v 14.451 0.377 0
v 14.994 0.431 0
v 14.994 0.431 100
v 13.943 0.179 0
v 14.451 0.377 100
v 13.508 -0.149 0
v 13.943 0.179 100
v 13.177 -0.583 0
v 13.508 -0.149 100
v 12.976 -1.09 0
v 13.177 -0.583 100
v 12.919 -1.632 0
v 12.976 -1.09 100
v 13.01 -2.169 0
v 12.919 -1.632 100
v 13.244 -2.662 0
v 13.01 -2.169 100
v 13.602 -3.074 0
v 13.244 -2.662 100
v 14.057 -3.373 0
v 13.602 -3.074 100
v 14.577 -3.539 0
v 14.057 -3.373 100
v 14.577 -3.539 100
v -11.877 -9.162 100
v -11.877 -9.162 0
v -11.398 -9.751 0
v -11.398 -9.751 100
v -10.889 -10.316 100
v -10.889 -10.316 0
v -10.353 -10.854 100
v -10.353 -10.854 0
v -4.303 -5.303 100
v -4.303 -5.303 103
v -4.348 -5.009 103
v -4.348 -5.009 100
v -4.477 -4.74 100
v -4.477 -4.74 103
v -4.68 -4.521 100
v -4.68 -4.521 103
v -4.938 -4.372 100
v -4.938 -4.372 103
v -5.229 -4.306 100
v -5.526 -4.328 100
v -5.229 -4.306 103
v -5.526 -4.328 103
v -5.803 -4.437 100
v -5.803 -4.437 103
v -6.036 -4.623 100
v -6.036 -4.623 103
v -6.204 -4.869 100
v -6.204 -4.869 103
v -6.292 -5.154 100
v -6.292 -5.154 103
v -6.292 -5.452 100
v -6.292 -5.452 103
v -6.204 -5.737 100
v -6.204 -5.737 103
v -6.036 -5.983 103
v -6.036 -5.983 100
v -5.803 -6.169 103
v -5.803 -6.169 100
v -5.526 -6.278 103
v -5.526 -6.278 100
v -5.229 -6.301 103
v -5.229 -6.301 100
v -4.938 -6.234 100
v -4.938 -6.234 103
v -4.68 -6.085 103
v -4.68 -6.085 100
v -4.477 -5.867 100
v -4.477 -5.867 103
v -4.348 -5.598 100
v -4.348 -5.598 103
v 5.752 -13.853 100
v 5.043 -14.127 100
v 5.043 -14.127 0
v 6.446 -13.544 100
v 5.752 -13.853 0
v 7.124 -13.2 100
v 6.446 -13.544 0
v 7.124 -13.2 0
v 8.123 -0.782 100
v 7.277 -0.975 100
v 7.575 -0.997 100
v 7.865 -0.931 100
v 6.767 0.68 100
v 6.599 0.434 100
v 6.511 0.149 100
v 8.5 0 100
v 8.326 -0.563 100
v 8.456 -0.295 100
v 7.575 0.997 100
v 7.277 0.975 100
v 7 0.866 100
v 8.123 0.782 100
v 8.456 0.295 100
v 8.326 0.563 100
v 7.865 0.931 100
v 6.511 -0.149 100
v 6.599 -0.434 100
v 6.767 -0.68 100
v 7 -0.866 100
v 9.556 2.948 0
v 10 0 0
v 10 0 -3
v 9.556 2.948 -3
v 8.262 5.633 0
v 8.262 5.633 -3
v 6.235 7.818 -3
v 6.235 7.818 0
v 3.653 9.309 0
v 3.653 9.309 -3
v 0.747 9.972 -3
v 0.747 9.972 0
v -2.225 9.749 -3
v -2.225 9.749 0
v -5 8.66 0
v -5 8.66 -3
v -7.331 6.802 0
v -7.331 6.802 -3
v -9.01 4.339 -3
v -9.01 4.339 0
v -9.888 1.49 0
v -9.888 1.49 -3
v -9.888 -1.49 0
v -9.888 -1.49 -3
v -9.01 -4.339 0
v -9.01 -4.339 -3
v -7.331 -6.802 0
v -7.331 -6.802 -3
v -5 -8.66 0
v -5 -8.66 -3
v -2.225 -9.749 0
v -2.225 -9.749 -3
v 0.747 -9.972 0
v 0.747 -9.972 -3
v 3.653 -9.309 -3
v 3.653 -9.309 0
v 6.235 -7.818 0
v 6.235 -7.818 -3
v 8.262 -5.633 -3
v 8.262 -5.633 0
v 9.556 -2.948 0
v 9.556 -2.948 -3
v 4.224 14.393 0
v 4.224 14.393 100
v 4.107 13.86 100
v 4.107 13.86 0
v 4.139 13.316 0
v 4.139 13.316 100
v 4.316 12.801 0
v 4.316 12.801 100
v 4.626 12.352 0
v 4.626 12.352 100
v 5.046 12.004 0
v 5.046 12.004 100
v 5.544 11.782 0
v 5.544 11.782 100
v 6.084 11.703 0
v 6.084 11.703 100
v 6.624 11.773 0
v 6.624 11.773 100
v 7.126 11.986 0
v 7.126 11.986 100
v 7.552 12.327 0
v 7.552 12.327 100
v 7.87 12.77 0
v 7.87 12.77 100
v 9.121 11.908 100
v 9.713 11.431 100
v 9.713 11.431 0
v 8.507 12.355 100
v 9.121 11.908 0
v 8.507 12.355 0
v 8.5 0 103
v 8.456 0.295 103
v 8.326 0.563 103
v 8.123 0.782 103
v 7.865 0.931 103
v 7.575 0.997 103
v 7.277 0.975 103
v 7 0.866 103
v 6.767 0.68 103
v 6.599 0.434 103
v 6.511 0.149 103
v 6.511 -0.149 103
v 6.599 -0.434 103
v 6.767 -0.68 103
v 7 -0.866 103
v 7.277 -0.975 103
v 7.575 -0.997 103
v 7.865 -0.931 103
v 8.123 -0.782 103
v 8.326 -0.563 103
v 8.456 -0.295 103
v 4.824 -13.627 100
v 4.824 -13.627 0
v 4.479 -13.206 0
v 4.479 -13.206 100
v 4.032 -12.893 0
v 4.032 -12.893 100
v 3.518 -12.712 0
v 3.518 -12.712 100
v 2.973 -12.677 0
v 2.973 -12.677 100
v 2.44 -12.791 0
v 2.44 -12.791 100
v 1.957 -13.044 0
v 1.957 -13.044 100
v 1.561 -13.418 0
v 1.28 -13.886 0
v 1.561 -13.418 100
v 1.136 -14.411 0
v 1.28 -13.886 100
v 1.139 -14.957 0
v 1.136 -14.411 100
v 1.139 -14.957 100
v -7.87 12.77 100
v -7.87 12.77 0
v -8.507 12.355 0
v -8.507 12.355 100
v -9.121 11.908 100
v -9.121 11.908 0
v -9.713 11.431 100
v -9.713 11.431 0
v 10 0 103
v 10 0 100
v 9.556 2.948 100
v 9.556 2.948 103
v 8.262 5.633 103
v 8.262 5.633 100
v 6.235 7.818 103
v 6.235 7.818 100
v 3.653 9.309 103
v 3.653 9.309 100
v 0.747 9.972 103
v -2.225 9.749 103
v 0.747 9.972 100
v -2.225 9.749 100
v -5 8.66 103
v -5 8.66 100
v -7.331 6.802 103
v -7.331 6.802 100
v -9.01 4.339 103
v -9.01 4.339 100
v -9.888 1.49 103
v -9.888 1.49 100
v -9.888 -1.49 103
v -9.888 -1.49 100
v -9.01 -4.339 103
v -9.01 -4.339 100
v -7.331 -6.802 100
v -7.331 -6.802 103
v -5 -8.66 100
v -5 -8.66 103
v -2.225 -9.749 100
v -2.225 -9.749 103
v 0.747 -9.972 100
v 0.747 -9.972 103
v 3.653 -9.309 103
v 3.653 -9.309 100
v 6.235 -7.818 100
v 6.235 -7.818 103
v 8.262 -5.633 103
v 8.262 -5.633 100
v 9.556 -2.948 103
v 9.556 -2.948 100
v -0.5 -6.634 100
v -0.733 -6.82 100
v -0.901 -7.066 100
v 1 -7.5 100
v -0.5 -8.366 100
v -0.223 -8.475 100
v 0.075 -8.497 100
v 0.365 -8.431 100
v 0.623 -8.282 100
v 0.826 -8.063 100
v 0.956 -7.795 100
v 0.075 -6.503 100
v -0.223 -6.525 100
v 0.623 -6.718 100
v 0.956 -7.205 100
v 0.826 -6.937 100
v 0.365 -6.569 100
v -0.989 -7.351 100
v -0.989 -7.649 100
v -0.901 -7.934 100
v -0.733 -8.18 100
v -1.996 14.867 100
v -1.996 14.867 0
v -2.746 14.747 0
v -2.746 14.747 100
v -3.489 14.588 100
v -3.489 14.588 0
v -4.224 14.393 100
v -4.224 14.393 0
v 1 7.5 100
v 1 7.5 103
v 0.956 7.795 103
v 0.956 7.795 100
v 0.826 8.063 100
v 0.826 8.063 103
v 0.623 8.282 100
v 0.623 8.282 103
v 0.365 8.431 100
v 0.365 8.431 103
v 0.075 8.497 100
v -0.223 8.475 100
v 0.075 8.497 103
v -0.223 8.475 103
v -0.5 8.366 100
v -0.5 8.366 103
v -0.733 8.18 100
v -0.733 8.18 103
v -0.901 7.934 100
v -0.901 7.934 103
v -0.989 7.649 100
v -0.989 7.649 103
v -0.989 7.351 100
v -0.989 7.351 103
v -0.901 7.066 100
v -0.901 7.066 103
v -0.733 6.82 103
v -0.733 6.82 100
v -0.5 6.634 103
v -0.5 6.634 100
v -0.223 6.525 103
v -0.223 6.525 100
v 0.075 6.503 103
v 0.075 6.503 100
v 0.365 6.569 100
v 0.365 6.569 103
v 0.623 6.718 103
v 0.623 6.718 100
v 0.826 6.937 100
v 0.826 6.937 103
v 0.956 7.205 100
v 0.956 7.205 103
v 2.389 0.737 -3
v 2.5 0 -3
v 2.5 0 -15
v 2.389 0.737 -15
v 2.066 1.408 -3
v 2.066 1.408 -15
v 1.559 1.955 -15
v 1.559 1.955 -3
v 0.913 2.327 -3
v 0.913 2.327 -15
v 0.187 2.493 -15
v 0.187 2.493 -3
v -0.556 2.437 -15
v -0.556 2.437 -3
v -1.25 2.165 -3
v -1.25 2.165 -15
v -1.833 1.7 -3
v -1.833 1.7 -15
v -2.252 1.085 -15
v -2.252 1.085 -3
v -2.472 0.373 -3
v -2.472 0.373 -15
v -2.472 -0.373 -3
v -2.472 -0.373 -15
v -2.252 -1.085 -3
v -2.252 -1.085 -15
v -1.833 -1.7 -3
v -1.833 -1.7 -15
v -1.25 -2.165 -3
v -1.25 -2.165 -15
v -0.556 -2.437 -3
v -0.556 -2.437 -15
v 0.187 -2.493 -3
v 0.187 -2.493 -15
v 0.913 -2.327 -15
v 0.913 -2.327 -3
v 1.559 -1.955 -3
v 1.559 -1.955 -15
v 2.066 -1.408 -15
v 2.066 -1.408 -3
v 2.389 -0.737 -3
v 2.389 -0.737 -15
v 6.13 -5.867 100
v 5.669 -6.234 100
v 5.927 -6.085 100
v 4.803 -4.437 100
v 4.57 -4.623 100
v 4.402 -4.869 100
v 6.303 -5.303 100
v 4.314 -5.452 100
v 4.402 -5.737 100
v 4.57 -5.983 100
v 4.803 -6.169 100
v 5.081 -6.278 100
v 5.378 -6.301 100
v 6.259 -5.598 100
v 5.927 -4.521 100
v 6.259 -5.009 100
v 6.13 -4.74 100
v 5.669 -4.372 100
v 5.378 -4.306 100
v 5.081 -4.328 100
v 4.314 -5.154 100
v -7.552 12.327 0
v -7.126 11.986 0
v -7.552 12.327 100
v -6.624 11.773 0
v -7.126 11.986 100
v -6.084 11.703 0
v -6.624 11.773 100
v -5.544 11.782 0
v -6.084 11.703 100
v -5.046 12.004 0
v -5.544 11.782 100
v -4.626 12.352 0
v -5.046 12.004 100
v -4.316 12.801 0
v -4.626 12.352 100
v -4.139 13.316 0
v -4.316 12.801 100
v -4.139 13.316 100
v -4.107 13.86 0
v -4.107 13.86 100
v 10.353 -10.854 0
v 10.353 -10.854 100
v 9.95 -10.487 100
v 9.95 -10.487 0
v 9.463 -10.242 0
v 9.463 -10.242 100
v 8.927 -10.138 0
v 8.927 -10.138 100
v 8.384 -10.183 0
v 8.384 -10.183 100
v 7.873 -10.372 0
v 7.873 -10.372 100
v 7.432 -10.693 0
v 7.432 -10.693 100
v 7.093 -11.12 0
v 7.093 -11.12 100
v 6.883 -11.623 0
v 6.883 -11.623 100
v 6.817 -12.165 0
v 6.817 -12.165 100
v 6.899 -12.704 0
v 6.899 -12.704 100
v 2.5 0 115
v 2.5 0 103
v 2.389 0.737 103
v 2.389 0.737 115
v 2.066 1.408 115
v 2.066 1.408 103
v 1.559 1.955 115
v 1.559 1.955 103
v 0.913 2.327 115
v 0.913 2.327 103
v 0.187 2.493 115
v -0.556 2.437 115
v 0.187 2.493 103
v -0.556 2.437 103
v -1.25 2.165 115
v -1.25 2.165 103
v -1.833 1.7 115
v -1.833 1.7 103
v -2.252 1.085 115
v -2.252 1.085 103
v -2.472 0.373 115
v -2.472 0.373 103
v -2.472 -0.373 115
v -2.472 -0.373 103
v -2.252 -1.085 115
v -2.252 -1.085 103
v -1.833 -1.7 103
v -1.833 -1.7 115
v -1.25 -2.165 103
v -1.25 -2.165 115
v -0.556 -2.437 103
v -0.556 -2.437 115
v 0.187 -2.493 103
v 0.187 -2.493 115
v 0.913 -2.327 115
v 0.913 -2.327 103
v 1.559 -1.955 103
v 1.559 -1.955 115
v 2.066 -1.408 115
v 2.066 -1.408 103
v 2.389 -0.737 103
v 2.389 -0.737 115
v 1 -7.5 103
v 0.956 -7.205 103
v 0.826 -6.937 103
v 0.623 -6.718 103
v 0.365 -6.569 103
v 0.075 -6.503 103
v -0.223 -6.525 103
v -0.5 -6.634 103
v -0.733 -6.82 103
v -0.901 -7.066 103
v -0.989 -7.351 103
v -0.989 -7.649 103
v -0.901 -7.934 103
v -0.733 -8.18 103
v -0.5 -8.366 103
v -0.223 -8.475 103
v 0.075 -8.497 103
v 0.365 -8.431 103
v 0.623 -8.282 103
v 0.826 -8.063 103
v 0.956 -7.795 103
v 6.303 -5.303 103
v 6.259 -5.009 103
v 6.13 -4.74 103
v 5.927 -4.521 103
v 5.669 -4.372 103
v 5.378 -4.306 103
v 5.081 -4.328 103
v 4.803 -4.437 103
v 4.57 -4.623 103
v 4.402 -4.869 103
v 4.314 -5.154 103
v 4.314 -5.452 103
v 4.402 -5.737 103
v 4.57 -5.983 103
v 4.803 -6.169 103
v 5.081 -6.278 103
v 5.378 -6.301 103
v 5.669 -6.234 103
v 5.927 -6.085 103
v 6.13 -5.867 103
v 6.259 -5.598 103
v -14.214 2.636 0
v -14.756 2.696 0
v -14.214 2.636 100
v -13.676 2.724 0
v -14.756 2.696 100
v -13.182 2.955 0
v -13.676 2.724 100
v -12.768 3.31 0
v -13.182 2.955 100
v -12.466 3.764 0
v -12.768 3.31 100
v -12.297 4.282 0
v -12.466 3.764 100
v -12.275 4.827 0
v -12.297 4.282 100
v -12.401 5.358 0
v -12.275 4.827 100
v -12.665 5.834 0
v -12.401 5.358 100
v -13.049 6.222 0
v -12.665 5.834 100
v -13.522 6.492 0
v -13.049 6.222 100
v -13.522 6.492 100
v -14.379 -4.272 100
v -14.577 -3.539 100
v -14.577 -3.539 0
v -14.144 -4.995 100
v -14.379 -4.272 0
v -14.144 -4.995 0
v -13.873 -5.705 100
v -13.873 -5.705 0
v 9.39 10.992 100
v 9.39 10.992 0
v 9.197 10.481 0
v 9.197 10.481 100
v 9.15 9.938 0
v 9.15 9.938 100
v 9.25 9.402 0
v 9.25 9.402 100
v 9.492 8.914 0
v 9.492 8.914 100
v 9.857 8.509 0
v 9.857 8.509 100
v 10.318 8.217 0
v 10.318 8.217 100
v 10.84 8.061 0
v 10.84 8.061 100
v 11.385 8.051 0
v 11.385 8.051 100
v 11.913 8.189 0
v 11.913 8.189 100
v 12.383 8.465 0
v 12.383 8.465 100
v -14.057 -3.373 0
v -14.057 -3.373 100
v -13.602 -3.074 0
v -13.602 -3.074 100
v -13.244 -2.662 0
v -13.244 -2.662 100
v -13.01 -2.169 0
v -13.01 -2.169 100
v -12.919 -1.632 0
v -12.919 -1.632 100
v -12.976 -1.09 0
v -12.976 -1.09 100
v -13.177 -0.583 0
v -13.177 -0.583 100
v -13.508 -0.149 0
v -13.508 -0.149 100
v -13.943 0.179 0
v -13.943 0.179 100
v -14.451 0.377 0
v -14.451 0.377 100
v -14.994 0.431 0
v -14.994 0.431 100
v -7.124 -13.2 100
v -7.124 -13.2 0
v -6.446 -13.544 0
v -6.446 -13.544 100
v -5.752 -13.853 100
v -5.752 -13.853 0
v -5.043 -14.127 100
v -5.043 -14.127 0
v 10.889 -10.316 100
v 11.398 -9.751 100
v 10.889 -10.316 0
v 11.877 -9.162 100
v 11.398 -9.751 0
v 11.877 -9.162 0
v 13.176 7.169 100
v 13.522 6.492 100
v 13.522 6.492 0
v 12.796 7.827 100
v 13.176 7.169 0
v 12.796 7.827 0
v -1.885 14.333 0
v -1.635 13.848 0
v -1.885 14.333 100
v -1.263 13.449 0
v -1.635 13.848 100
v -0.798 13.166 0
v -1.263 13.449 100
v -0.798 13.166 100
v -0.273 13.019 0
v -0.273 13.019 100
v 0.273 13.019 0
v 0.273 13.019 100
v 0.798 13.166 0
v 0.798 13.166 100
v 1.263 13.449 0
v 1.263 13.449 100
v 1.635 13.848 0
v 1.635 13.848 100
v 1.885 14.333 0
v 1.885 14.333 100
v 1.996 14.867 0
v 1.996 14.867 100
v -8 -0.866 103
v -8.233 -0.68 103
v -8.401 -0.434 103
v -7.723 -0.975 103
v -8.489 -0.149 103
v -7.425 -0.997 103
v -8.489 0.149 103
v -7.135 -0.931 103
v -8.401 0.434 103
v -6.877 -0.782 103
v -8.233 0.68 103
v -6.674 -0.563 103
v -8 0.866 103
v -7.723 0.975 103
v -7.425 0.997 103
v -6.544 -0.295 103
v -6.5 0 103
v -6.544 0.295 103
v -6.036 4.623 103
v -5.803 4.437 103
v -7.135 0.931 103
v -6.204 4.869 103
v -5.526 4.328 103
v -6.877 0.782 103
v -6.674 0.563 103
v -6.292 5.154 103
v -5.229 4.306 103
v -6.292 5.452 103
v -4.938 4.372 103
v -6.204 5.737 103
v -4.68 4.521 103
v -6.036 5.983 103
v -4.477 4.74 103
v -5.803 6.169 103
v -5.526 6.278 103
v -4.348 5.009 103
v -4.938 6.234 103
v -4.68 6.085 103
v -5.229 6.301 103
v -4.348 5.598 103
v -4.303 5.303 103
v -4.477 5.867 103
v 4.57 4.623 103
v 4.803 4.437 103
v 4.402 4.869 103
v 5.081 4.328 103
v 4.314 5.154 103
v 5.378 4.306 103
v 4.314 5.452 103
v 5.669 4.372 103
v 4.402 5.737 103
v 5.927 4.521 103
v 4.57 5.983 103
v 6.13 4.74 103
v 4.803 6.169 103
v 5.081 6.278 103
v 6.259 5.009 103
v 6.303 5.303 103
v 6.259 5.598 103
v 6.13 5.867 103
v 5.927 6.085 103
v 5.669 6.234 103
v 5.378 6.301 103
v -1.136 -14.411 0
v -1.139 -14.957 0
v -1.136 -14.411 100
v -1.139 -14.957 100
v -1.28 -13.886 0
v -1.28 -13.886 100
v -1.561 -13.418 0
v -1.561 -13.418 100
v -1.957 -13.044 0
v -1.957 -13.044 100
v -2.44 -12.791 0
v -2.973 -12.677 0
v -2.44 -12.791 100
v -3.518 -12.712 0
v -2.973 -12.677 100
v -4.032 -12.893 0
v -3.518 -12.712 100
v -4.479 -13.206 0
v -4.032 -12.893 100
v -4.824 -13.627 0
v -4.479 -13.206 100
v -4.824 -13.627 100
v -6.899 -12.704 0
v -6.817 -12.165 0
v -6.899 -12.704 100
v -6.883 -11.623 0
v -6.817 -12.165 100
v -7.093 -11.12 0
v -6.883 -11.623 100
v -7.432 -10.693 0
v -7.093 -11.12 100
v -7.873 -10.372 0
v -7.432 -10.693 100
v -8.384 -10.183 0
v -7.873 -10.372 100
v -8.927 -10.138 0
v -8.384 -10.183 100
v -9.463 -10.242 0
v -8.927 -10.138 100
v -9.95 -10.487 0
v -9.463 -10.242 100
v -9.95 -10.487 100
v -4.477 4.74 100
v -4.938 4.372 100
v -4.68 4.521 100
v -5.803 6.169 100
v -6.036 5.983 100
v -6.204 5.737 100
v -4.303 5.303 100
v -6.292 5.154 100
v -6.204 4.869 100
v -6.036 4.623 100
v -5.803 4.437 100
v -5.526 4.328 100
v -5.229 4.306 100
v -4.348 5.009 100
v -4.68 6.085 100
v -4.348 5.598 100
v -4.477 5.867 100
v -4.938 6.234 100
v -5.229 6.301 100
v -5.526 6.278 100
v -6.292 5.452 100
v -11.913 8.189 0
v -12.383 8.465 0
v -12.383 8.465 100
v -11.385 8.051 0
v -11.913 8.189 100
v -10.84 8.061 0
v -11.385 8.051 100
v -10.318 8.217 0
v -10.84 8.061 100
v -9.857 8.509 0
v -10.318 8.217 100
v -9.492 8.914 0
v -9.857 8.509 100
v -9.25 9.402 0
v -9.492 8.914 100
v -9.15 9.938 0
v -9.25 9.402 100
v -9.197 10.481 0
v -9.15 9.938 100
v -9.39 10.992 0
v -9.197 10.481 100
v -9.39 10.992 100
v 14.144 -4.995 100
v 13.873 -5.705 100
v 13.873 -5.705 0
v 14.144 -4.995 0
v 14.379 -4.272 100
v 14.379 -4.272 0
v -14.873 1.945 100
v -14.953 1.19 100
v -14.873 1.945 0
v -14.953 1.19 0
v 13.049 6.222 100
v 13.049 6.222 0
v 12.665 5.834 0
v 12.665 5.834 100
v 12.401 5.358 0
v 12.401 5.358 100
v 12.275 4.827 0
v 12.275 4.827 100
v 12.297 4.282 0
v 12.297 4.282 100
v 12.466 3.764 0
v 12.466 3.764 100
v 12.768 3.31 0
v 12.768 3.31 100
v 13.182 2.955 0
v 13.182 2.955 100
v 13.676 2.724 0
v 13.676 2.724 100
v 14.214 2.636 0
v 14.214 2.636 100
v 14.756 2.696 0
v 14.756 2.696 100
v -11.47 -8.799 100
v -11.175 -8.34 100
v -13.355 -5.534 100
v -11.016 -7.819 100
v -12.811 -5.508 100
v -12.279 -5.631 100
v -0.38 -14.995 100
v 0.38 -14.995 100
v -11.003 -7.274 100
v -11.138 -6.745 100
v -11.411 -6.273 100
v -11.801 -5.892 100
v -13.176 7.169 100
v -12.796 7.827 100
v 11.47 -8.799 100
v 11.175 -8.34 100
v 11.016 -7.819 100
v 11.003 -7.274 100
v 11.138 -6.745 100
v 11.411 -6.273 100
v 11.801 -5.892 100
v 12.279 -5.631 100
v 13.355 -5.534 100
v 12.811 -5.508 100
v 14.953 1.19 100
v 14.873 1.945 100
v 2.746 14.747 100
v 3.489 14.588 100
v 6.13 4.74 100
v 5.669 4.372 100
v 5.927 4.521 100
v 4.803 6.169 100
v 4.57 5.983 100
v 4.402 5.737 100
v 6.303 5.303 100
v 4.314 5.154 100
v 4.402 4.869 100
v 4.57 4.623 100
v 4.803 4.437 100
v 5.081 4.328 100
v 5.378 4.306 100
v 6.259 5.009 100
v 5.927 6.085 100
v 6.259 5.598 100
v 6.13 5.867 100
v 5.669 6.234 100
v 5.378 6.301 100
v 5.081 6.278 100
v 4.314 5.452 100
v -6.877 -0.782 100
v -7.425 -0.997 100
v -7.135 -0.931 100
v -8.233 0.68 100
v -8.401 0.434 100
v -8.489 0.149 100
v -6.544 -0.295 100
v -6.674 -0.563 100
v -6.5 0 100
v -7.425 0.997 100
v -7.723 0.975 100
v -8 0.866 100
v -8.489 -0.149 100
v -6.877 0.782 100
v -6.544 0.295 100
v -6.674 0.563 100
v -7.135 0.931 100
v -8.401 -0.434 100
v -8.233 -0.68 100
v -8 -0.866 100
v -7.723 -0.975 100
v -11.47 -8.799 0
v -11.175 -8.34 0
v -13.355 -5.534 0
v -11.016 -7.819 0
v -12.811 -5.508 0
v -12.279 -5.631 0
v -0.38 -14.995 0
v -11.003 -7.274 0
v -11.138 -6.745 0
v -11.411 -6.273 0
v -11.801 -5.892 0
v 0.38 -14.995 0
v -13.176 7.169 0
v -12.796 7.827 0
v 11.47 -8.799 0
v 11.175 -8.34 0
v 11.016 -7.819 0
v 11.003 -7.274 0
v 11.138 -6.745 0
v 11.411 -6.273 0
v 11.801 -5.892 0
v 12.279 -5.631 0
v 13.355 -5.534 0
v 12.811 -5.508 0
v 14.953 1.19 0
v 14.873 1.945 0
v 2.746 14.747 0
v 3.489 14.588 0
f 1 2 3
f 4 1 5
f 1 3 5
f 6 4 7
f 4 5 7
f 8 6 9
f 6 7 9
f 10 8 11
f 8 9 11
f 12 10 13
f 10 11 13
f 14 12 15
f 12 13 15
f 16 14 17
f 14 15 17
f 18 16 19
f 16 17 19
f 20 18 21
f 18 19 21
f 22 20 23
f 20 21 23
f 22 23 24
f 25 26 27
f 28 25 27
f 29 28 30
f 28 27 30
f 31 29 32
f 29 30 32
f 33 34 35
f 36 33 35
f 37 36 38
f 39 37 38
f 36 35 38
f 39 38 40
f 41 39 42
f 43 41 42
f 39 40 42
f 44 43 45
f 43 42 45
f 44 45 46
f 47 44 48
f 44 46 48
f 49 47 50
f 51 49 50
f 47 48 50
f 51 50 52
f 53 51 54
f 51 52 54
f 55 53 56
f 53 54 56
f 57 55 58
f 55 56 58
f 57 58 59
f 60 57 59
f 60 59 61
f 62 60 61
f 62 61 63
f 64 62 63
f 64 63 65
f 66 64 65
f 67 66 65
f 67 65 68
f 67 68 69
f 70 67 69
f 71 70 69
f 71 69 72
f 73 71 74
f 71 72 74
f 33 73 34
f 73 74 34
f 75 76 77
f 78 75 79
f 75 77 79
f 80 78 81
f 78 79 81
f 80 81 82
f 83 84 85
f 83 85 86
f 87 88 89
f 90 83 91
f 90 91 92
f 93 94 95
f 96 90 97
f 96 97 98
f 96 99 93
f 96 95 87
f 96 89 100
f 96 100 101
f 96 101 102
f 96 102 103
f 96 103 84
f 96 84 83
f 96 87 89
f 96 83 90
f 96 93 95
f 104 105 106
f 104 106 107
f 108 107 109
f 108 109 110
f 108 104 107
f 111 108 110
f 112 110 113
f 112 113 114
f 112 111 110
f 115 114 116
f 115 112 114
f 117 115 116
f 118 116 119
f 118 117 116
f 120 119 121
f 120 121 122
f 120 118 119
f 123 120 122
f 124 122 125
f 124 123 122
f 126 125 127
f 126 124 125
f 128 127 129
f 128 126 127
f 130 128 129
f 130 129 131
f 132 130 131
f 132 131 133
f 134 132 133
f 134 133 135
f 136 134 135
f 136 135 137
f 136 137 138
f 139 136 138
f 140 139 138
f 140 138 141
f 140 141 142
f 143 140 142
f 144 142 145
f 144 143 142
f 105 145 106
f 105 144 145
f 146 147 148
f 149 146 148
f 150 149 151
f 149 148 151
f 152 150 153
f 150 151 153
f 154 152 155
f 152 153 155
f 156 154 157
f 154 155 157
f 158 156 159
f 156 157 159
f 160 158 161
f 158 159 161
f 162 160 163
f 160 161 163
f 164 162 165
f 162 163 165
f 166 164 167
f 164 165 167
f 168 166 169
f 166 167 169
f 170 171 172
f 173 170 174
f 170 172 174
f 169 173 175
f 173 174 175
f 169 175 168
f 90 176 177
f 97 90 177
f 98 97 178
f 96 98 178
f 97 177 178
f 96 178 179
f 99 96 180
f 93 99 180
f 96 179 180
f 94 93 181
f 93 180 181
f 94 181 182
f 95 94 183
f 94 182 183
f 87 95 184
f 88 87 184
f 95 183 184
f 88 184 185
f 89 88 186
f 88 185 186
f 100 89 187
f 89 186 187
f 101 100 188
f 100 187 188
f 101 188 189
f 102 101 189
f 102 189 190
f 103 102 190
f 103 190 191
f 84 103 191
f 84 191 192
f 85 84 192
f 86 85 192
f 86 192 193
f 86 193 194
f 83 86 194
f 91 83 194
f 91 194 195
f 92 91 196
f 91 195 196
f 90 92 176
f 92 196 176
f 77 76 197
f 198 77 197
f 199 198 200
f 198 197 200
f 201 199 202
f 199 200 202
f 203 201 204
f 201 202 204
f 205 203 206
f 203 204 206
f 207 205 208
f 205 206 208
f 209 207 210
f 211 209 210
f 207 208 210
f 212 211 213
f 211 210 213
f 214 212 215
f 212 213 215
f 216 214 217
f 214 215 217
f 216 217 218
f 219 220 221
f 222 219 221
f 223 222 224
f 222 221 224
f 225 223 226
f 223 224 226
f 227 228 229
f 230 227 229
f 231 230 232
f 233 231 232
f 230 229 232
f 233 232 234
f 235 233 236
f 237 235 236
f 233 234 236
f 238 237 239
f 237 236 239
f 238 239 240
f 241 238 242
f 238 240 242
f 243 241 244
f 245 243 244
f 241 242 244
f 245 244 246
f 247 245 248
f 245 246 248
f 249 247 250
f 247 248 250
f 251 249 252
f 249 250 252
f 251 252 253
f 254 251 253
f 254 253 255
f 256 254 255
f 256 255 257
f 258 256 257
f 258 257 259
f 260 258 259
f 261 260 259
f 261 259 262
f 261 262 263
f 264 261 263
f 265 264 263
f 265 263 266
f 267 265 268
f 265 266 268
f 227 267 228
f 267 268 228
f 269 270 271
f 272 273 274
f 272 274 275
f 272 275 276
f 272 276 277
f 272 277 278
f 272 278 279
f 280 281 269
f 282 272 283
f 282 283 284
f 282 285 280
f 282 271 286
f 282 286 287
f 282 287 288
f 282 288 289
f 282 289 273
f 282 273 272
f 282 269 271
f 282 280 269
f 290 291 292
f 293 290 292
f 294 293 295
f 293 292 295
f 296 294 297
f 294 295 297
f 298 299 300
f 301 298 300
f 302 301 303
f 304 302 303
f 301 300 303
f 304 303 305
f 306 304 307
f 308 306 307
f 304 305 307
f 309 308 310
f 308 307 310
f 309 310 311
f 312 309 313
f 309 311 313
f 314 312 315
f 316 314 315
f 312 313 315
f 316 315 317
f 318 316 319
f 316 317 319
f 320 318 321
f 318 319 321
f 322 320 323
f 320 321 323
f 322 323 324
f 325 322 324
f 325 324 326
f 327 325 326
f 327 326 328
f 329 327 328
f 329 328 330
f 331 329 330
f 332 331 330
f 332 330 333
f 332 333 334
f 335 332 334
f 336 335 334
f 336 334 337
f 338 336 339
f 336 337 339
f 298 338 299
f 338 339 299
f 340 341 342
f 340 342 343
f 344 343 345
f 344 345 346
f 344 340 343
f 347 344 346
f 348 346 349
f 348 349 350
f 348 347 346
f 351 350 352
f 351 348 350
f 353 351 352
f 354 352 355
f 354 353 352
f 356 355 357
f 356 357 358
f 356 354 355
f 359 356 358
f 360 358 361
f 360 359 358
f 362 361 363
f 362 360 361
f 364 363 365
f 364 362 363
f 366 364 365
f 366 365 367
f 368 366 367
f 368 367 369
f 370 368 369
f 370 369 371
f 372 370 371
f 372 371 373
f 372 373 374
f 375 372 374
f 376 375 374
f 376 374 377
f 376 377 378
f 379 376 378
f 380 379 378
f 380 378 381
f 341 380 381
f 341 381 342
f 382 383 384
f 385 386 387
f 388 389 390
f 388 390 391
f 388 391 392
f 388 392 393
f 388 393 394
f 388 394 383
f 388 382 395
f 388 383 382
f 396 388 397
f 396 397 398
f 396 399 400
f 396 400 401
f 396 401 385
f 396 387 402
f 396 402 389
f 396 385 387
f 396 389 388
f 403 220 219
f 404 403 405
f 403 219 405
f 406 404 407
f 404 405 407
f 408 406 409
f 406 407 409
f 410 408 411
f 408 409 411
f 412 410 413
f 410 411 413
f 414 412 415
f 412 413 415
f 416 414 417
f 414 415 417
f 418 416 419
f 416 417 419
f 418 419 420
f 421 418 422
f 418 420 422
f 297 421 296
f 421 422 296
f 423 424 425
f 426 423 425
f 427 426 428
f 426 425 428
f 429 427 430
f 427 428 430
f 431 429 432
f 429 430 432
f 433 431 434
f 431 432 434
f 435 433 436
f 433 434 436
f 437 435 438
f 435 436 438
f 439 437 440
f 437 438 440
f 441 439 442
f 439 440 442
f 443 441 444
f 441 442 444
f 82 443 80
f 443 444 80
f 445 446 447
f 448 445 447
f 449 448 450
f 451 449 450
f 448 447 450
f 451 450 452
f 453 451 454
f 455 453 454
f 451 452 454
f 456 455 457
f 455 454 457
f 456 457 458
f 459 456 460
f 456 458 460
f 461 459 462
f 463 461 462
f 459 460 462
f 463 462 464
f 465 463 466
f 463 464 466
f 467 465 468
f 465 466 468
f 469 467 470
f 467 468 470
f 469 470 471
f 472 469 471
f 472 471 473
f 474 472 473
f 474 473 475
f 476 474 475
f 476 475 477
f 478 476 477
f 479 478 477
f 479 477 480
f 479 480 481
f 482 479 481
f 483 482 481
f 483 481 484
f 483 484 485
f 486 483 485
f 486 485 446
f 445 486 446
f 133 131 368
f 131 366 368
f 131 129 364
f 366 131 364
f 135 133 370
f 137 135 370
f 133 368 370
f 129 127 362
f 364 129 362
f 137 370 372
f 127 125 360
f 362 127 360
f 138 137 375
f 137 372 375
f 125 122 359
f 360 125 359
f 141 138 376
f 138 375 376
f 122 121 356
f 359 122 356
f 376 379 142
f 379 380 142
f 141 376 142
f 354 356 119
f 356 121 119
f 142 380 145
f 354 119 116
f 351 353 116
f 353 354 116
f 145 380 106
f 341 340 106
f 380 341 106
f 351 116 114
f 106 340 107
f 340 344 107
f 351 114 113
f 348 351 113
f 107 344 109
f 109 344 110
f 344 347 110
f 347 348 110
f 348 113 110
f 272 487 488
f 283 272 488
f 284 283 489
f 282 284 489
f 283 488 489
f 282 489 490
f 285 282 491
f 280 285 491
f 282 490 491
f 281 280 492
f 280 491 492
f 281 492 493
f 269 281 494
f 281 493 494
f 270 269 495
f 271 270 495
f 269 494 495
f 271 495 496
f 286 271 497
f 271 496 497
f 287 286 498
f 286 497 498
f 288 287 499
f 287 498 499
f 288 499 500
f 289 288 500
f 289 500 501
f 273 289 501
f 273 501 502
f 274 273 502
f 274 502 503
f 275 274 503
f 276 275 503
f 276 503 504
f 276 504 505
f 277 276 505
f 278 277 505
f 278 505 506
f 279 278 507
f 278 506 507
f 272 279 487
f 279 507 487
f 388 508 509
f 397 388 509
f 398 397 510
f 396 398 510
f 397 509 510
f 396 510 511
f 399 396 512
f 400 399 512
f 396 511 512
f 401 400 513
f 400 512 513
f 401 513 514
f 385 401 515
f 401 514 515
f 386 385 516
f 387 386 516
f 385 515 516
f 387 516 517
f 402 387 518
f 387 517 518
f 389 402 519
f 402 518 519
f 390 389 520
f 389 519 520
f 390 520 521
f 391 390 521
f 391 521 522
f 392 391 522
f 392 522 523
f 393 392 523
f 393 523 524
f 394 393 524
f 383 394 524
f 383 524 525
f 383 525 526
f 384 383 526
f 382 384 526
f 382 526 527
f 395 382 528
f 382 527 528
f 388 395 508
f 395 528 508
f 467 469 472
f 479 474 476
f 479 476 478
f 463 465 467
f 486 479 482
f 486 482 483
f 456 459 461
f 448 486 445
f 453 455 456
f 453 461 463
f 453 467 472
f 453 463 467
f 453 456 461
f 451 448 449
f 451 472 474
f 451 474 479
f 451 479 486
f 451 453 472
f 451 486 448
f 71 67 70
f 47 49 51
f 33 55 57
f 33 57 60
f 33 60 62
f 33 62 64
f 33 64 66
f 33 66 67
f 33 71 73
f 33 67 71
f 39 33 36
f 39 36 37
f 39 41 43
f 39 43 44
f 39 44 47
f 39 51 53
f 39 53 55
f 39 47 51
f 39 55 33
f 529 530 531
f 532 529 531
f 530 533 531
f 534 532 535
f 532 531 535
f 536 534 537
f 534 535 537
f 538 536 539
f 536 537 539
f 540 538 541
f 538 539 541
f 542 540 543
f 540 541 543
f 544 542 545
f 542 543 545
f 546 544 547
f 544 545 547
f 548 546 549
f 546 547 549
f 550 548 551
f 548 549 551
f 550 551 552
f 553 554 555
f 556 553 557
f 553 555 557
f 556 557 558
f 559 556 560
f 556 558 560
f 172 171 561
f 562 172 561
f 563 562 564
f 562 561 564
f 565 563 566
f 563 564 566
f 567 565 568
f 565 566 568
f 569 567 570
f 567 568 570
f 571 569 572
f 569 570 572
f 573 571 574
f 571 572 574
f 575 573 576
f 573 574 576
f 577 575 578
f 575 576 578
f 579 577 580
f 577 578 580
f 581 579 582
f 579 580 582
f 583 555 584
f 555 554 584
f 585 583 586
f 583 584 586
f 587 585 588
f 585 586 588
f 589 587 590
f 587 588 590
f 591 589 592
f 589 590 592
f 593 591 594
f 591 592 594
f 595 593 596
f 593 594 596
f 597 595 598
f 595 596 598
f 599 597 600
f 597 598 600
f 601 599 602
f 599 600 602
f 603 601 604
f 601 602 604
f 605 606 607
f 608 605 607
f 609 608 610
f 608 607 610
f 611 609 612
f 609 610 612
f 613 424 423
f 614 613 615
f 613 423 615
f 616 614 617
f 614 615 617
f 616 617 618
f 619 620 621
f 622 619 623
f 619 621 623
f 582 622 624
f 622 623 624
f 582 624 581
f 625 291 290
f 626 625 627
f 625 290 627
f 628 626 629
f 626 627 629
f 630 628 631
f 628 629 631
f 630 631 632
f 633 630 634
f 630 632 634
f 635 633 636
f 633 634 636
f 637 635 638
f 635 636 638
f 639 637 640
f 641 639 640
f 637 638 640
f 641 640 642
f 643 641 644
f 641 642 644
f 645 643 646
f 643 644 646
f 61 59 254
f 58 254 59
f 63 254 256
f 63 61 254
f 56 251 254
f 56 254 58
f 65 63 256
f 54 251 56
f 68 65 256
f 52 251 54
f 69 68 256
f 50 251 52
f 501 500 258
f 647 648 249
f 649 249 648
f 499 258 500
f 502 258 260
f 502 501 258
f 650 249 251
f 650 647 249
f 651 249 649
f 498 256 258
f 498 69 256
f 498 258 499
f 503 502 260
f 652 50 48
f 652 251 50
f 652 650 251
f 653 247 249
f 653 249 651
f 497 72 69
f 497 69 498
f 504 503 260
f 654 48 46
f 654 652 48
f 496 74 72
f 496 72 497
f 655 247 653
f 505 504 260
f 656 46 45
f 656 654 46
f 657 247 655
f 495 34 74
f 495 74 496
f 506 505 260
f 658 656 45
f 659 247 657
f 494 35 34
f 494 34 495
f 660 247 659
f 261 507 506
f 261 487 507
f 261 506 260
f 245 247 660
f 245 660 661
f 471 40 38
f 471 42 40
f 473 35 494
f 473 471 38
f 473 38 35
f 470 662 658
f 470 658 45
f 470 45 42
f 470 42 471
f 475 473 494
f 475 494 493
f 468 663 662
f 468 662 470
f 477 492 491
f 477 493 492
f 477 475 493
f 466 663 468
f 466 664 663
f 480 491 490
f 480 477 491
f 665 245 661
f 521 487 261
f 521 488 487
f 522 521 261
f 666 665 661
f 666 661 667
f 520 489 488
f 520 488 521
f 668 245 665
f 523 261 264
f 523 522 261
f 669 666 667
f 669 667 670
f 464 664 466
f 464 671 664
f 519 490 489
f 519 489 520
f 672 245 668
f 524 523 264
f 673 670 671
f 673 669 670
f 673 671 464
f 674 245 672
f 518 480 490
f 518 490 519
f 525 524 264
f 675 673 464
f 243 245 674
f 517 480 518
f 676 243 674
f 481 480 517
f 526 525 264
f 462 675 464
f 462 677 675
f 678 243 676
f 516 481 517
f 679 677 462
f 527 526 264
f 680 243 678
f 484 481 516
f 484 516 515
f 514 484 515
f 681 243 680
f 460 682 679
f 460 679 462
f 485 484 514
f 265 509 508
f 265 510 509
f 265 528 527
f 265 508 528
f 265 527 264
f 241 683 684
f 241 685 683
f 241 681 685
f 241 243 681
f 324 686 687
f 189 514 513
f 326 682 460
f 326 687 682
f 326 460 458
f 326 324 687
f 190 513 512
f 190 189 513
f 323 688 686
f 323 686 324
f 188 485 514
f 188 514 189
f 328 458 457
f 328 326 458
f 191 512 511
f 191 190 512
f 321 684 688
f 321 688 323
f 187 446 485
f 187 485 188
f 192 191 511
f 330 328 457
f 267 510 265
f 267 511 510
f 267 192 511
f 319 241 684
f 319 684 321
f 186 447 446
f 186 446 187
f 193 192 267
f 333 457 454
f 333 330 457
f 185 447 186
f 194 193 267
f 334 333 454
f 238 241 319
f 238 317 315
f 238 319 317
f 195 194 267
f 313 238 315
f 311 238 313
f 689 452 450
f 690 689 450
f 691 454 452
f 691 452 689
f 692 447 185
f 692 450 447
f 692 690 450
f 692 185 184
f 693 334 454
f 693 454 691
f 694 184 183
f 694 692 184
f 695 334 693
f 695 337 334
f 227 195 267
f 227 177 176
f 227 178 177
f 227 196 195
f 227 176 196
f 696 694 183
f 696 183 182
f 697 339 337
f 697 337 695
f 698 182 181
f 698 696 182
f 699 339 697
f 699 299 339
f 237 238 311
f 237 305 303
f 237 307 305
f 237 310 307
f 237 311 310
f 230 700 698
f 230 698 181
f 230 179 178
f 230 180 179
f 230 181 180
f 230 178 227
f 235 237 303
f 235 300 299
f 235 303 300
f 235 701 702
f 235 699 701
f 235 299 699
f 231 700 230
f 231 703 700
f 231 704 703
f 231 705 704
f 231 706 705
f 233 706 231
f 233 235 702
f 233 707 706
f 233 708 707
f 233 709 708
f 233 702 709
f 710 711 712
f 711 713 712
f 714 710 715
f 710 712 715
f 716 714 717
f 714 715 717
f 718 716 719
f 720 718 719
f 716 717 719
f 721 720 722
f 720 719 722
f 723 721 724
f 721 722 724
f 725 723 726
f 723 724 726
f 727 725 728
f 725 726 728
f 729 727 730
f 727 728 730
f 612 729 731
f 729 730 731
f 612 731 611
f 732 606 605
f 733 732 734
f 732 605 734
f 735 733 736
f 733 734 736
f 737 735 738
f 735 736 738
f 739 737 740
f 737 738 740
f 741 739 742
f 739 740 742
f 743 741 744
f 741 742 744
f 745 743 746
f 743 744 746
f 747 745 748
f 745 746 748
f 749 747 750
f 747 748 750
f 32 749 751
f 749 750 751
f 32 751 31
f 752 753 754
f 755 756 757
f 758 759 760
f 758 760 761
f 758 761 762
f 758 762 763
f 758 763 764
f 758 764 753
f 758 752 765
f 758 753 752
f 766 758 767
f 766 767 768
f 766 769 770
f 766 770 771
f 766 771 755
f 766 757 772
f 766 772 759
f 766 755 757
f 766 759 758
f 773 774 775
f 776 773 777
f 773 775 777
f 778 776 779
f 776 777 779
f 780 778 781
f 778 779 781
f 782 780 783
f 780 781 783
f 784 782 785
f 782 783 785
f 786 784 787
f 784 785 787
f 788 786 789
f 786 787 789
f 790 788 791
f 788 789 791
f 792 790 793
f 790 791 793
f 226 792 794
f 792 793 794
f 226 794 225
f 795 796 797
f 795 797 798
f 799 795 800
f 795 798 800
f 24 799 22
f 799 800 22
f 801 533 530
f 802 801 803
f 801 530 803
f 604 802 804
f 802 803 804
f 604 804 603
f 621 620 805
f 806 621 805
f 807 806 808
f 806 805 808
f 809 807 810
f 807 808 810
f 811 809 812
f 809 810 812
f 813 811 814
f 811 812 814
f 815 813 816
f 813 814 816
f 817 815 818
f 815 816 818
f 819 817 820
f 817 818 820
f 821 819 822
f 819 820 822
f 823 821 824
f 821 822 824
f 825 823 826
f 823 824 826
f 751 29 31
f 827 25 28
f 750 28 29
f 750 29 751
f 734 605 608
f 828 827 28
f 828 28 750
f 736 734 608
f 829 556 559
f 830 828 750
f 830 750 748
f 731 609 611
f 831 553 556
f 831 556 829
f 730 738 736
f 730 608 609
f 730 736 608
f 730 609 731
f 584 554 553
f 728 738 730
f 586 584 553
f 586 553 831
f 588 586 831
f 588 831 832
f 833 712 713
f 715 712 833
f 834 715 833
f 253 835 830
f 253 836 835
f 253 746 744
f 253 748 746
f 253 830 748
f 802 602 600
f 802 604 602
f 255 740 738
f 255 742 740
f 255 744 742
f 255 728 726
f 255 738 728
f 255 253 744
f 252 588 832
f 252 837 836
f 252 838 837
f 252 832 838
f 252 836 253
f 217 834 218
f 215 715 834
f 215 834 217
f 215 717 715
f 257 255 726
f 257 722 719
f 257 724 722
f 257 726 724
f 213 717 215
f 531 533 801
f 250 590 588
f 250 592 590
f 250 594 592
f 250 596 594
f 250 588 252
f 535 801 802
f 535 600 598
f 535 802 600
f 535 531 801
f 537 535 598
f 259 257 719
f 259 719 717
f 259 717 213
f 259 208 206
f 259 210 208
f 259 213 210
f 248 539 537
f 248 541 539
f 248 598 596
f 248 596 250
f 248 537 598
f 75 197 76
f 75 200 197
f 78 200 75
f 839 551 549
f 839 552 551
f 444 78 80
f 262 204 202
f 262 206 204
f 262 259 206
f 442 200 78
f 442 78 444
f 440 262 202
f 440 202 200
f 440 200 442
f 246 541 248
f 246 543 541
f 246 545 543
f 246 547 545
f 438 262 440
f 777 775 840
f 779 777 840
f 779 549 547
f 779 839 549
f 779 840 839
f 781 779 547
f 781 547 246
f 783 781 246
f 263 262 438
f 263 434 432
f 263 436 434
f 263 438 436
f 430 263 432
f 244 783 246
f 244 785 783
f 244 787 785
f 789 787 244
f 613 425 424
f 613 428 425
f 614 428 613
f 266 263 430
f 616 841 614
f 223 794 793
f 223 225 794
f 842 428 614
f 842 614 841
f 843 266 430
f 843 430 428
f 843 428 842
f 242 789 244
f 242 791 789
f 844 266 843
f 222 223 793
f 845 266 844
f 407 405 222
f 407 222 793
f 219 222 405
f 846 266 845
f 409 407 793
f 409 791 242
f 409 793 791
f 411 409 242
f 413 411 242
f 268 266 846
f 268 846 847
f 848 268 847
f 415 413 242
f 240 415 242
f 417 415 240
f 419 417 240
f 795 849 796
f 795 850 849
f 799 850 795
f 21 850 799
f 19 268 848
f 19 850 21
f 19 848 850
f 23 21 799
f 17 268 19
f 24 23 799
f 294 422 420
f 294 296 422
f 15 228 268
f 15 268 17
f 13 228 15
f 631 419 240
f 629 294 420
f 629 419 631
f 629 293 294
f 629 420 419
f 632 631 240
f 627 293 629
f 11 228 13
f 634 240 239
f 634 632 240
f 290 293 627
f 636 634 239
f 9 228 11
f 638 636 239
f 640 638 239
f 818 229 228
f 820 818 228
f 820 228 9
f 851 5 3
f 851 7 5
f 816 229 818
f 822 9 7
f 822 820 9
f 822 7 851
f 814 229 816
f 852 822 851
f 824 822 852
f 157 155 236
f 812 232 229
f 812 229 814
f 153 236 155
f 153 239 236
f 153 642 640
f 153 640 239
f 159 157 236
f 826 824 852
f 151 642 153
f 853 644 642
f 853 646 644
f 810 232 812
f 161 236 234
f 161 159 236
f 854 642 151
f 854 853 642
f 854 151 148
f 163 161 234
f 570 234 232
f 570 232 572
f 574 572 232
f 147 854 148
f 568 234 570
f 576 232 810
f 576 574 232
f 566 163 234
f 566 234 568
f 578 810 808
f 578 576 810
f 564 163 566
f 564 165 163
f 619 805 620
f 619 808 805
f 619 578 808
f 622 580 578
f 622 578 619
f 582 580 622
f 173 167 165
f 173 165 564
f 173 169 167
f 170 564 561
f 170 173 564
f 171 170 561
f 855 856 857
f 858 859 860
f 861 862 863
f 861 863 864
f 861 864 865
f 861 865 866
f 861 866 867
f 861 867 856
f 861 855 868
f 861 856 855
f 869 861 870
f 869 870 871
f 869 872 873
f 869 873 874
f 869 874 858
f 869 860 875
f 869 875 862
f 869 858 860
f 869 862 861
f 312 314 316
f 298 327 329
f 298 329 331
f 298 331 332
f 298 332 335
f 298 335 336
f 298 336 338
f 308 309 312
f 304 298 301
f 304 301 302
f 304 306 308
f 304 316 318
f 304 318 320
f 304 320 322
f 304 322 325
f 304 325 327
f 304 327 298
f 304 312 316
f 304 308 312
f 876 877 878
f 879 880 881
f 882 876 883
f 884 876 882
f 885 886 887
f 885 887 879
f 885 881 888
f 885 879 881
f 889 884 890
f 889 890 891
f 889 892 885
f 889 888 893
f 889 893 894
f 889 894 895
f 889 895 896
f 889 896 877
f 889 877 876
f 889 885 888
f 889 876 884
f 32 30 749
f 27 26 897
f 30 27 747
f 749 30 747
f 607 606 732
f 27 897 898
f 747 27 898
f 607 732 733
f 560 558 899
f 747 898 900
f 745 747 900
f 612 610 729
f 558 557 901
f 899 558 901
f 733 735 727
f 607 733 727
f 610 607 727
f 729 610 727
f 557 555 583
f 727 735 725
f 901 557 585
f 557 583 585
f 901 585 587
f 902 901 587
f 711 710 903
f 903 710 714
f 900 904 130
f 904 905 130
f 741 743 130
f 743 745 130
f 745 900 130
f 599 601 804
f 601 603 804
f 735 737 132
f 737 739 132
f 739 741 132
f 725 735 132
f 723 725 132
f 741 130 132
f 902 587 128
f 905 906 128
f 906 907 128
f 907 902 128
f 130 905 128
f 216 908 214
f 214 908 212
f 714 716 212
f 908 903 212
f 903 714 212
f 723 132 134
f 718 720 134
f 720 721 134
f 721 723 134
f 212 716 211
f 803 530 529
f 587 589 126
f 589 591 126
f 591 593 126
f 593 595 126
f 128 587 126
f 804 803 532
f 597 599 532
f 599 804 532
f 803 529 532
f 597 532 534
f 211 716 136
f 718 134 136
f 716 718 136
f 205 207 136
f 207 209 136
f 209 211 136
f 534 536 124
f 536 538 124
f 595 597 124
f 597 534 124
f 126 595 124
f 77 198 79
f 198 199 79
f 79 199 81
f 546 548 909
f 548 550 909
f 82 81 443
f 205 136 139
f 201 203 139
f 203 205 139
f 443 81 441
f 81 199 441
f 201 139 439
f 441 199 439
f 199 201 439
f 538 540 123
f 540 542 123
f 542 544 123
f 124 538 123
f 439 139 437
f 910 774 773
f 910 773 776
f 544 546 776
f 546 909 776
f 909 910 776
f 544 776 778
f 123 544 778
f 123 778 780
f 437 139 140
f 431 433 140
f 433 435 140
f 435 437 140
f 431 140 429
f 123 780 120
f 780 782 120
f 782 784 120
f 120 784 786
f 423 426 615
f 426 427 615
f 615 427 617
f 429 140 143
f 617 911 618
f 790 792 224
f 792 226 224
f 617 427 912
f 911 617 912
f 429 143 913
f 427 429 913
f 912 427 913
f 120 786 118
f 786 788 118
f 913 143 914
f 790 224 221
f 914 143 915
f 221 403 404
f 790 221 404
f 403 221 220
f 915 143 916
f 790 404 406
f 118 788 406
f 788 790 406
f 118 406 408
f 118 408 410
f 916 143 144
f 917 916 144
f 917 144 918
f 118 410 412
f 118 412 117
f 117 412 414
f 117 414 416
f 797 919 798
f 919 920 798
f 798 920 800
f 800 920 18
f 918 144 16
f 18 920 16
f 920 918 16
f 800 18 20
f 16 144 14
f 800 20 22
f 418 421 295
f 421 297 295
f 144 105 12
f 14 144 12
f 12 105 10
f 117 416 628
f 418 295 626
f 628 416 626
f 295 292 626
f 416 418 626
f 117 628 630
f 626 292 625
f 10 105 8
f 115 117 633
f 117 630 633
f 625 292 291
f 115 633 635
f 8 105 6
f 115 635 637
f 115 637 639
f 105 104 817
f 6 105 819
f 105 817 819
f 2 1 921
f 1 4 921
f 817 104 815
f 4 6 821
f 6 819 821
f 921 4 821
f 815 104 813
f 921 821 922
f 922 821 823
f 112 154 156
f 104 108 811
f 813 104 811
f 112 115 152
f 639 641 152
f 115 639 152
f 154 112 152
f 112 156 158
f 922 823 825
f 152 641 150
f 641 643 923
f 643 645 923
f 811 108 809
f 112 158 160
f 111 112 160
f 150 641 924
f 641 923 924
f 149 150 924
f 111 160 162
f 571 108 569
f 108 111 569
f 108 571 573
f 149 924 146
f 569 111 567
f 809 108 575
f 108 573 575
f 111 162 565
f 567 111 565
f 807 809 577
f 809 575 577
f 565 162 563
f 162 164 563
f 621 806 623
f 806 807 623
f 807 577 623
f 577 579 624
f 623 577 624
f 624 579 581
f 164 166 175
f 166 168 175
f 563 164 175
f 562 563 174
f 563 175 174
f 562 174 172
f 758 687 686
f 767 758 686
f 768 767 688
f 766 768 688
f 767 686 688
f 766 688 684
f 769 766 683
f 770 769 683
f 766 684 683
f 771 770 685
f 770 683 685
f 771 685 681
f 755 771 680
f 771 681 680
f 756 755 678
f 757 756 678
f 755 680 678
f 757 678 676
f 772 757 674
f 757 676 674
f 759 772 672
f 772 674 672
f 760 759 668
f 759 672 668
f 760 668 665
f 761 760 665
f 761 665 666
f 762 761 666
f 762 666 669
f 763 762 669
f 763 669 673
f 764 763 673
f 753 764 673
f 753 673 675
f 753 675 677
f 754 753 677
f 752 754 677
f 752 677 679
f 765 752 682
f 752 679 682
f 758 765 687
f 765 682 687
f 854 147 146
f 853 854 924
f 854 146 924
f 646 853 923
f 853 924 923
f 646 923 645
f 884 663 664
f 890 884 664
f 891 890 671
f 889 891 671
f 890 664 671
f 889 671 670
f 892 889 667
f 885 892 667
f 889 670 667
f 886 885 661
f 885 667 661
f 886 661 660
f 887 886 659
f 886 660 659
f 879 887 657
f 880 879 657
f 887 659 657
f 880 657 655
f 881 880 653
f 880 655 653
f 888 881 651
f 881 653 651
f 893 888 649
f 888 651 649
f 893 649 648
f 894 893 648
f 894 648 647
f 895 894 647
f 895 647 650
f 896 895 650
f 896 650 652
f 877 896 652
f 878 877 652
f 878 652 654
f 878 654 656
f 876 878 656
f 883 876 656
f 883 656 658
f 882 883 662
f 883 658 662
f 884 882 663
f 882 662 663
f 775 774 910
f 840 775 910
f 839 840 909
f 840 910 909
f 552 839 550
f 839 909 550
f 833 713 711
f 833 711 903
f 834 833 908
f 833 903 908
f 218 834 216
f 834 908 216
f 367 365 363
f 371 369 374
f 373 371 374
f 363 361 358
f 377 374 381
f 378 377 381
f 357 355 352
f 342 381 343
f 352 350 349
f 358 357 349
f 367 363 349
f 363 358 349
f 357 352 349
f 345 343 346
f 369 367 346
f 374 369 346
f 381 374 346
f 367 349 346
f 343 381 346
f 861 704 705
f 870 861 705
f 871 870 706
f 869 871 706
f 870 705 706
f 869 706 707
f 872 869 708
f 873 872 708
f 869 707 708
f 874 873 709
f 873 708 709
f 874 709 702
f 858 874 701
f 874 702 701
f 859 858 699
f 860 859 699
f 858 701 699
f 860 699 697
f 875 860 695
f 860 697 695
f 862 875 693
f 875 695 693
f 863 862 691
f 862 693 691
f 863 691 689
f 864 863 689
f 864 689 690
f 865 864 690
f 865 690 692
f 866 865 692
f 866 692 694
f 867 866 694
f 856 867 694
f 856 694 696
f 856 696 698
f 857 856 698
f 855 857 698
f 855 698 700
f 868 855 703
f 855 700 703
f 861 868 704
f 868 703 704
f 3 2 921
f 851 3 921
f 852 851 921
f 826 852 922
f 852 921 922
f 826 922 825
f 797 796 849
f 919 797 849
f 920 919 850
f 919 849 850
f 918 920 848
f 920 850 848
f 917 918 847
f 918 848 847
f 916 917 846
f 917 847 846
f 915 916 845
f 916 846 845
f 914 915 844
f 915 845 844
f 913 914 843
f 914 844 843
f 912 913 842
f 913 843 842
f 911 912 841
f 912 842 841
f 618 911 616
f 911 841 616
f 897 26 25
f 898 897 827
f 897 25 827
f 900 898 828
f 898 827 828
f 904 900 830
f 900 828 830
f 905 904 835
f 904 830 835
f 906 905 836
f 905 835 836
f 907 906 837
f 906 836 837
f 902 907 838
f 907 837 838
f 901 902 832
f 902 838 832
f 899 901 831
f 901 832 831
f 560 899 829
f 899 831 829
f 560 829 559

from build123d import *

# Parameters (mm, degrees)
SKETCH1_R           = 15
BOSS_EXTRUDE1_DEPTH = 100
SKETCH2_R           = 2.5
BOSS_EXTRUDE3_DEPTH = 15
SKETCH4_R           = 10
SKETCH4_R_2         = 2.5
BOSS_EXTRUDE4_DEPTH = 3
SKETCH7_R           = 1
CUT_EXTRUDE1_DEPTH  = 3
SKETCH8_R           = 2
CUT_EXTRUDE2_DEPTH  = 116


with BuildPart() as part:
    # Sketch1 → Boss-Extrude1 (new body)
    with BuildSketch(Plane.XY):
        Circle(SKETCH1_R)
    extrude(amount=BOSS_EXTRUDE1_DEPTH)

    # Sketch2 → Boss-Extrude3 (add)
    with BuildSketch(Plane.XY.offset(100)):
        Circle(SKETCH2_R)
    boss_extrude3 = extrude(amount=BOSS_EXTRUDE3_DEPTH)

    # Sketch4 → Boss-Extrude4 (add)
    with BuildSketch(Plane.XY.offset(100)):
        Circle(SKETCH4_R)
        Circle(SKETCH4_R_2, mode=Mode.SUBTRACT)
    boss_extrude4 = extrude(amount=BOSS_EXTRUDE4_DEPTH)

    # Mirror1: Boss-Extrude3, Boss-Extrude4 across plane
    add(boss_extrude3.mirror(Plane.XY.offset(50)))
    add(boss_extrude4.mirror(Plane.XY.offset(50)))

    # Sketch7 → Cut-Extrude1 (cut)
    with BuildSketch(Plane.XY.offset(103)):
        with Locations((0, 7.5)):
            Circle(SKETCH7_R)
        with Locations((5.303300859, 5.303300859)):
            Circle(SKETCH7_R)
        with Locations((7.5, 0)):
            Circle(SKETCH7_R)
        with Locations((5.303300859, -5.303300859)):
            Circle(SKETCH7_R)
        with Locations((0, -7.5)):
            Circle(SKETCH7_R)
        with Locations((-5.303300859, -5.303300859)):
            Circle(SKETCH7_R)
        with Locations((-7.5, 0)):
            Circle(SKETCH7_R)
        with Locations((-5.303300859, 5.303300859)):
            Circle(SKETCH7_R)
    extrude(amount=-CUT_EXTRUDE1_DEPTH, mode=Mode.SUBTRACT)

    # Sketch8 → Cut-Extrude2 (cut, through all)
    with BuildSketch(Plane.XY.offset(100)):
        with Locations((0, 15)):
            Circle(SKETCH8_R)
        with Locations((6.101049646, 13.703181865)):
            Circle(SKETCH8_R)
        with Locations((11.147172382, 10.036959095)):
            Circle(SKETCH8_R)
        with Locations((14.265847744, 4.635254916)):
            Circle(SKETCH8_R)
        with Locations((14.917828431, -1.567926949)):
            Circle(SKETCH8_R)
        with Locations((12.990381057, -7.5)):
            Circle(SKETCH8_R)
        with Locations((8.816778784, -12.135254916)):
            Circle(SKETCH8_R)
        with Locations((3.118675362, -14.672214011)):
            Circle(SKETCH8_R)
        with Locations((-3.118675362, -14.672214011)):
            Circle(SKETCH8_R)
        with Locations((-8.816778784, -12.135254916)):
            Circle(SKETCH8_R)
        with Locations((-12.990381057, -7.5)):
            Circle(SKETCH8_R)
        with Locations((-14.917828431, -1.567926949)):
            Circle(SKETCH8_R)
        with Locations((-14.265847744, 4.635254916)):
            Circle(SKETCH8_R)
        with Locations((-11.147172382, 10.036959095)):
            Circle(SKETCH8_R)
        with Locations((-6.101049646, 13.703181865)):
            Circle(SKETCH8_R)
    extrude(amount=-CUT_EXTRUDE2_DEPTH, mode=Mode.SUBTRACT)


solid = part.part
